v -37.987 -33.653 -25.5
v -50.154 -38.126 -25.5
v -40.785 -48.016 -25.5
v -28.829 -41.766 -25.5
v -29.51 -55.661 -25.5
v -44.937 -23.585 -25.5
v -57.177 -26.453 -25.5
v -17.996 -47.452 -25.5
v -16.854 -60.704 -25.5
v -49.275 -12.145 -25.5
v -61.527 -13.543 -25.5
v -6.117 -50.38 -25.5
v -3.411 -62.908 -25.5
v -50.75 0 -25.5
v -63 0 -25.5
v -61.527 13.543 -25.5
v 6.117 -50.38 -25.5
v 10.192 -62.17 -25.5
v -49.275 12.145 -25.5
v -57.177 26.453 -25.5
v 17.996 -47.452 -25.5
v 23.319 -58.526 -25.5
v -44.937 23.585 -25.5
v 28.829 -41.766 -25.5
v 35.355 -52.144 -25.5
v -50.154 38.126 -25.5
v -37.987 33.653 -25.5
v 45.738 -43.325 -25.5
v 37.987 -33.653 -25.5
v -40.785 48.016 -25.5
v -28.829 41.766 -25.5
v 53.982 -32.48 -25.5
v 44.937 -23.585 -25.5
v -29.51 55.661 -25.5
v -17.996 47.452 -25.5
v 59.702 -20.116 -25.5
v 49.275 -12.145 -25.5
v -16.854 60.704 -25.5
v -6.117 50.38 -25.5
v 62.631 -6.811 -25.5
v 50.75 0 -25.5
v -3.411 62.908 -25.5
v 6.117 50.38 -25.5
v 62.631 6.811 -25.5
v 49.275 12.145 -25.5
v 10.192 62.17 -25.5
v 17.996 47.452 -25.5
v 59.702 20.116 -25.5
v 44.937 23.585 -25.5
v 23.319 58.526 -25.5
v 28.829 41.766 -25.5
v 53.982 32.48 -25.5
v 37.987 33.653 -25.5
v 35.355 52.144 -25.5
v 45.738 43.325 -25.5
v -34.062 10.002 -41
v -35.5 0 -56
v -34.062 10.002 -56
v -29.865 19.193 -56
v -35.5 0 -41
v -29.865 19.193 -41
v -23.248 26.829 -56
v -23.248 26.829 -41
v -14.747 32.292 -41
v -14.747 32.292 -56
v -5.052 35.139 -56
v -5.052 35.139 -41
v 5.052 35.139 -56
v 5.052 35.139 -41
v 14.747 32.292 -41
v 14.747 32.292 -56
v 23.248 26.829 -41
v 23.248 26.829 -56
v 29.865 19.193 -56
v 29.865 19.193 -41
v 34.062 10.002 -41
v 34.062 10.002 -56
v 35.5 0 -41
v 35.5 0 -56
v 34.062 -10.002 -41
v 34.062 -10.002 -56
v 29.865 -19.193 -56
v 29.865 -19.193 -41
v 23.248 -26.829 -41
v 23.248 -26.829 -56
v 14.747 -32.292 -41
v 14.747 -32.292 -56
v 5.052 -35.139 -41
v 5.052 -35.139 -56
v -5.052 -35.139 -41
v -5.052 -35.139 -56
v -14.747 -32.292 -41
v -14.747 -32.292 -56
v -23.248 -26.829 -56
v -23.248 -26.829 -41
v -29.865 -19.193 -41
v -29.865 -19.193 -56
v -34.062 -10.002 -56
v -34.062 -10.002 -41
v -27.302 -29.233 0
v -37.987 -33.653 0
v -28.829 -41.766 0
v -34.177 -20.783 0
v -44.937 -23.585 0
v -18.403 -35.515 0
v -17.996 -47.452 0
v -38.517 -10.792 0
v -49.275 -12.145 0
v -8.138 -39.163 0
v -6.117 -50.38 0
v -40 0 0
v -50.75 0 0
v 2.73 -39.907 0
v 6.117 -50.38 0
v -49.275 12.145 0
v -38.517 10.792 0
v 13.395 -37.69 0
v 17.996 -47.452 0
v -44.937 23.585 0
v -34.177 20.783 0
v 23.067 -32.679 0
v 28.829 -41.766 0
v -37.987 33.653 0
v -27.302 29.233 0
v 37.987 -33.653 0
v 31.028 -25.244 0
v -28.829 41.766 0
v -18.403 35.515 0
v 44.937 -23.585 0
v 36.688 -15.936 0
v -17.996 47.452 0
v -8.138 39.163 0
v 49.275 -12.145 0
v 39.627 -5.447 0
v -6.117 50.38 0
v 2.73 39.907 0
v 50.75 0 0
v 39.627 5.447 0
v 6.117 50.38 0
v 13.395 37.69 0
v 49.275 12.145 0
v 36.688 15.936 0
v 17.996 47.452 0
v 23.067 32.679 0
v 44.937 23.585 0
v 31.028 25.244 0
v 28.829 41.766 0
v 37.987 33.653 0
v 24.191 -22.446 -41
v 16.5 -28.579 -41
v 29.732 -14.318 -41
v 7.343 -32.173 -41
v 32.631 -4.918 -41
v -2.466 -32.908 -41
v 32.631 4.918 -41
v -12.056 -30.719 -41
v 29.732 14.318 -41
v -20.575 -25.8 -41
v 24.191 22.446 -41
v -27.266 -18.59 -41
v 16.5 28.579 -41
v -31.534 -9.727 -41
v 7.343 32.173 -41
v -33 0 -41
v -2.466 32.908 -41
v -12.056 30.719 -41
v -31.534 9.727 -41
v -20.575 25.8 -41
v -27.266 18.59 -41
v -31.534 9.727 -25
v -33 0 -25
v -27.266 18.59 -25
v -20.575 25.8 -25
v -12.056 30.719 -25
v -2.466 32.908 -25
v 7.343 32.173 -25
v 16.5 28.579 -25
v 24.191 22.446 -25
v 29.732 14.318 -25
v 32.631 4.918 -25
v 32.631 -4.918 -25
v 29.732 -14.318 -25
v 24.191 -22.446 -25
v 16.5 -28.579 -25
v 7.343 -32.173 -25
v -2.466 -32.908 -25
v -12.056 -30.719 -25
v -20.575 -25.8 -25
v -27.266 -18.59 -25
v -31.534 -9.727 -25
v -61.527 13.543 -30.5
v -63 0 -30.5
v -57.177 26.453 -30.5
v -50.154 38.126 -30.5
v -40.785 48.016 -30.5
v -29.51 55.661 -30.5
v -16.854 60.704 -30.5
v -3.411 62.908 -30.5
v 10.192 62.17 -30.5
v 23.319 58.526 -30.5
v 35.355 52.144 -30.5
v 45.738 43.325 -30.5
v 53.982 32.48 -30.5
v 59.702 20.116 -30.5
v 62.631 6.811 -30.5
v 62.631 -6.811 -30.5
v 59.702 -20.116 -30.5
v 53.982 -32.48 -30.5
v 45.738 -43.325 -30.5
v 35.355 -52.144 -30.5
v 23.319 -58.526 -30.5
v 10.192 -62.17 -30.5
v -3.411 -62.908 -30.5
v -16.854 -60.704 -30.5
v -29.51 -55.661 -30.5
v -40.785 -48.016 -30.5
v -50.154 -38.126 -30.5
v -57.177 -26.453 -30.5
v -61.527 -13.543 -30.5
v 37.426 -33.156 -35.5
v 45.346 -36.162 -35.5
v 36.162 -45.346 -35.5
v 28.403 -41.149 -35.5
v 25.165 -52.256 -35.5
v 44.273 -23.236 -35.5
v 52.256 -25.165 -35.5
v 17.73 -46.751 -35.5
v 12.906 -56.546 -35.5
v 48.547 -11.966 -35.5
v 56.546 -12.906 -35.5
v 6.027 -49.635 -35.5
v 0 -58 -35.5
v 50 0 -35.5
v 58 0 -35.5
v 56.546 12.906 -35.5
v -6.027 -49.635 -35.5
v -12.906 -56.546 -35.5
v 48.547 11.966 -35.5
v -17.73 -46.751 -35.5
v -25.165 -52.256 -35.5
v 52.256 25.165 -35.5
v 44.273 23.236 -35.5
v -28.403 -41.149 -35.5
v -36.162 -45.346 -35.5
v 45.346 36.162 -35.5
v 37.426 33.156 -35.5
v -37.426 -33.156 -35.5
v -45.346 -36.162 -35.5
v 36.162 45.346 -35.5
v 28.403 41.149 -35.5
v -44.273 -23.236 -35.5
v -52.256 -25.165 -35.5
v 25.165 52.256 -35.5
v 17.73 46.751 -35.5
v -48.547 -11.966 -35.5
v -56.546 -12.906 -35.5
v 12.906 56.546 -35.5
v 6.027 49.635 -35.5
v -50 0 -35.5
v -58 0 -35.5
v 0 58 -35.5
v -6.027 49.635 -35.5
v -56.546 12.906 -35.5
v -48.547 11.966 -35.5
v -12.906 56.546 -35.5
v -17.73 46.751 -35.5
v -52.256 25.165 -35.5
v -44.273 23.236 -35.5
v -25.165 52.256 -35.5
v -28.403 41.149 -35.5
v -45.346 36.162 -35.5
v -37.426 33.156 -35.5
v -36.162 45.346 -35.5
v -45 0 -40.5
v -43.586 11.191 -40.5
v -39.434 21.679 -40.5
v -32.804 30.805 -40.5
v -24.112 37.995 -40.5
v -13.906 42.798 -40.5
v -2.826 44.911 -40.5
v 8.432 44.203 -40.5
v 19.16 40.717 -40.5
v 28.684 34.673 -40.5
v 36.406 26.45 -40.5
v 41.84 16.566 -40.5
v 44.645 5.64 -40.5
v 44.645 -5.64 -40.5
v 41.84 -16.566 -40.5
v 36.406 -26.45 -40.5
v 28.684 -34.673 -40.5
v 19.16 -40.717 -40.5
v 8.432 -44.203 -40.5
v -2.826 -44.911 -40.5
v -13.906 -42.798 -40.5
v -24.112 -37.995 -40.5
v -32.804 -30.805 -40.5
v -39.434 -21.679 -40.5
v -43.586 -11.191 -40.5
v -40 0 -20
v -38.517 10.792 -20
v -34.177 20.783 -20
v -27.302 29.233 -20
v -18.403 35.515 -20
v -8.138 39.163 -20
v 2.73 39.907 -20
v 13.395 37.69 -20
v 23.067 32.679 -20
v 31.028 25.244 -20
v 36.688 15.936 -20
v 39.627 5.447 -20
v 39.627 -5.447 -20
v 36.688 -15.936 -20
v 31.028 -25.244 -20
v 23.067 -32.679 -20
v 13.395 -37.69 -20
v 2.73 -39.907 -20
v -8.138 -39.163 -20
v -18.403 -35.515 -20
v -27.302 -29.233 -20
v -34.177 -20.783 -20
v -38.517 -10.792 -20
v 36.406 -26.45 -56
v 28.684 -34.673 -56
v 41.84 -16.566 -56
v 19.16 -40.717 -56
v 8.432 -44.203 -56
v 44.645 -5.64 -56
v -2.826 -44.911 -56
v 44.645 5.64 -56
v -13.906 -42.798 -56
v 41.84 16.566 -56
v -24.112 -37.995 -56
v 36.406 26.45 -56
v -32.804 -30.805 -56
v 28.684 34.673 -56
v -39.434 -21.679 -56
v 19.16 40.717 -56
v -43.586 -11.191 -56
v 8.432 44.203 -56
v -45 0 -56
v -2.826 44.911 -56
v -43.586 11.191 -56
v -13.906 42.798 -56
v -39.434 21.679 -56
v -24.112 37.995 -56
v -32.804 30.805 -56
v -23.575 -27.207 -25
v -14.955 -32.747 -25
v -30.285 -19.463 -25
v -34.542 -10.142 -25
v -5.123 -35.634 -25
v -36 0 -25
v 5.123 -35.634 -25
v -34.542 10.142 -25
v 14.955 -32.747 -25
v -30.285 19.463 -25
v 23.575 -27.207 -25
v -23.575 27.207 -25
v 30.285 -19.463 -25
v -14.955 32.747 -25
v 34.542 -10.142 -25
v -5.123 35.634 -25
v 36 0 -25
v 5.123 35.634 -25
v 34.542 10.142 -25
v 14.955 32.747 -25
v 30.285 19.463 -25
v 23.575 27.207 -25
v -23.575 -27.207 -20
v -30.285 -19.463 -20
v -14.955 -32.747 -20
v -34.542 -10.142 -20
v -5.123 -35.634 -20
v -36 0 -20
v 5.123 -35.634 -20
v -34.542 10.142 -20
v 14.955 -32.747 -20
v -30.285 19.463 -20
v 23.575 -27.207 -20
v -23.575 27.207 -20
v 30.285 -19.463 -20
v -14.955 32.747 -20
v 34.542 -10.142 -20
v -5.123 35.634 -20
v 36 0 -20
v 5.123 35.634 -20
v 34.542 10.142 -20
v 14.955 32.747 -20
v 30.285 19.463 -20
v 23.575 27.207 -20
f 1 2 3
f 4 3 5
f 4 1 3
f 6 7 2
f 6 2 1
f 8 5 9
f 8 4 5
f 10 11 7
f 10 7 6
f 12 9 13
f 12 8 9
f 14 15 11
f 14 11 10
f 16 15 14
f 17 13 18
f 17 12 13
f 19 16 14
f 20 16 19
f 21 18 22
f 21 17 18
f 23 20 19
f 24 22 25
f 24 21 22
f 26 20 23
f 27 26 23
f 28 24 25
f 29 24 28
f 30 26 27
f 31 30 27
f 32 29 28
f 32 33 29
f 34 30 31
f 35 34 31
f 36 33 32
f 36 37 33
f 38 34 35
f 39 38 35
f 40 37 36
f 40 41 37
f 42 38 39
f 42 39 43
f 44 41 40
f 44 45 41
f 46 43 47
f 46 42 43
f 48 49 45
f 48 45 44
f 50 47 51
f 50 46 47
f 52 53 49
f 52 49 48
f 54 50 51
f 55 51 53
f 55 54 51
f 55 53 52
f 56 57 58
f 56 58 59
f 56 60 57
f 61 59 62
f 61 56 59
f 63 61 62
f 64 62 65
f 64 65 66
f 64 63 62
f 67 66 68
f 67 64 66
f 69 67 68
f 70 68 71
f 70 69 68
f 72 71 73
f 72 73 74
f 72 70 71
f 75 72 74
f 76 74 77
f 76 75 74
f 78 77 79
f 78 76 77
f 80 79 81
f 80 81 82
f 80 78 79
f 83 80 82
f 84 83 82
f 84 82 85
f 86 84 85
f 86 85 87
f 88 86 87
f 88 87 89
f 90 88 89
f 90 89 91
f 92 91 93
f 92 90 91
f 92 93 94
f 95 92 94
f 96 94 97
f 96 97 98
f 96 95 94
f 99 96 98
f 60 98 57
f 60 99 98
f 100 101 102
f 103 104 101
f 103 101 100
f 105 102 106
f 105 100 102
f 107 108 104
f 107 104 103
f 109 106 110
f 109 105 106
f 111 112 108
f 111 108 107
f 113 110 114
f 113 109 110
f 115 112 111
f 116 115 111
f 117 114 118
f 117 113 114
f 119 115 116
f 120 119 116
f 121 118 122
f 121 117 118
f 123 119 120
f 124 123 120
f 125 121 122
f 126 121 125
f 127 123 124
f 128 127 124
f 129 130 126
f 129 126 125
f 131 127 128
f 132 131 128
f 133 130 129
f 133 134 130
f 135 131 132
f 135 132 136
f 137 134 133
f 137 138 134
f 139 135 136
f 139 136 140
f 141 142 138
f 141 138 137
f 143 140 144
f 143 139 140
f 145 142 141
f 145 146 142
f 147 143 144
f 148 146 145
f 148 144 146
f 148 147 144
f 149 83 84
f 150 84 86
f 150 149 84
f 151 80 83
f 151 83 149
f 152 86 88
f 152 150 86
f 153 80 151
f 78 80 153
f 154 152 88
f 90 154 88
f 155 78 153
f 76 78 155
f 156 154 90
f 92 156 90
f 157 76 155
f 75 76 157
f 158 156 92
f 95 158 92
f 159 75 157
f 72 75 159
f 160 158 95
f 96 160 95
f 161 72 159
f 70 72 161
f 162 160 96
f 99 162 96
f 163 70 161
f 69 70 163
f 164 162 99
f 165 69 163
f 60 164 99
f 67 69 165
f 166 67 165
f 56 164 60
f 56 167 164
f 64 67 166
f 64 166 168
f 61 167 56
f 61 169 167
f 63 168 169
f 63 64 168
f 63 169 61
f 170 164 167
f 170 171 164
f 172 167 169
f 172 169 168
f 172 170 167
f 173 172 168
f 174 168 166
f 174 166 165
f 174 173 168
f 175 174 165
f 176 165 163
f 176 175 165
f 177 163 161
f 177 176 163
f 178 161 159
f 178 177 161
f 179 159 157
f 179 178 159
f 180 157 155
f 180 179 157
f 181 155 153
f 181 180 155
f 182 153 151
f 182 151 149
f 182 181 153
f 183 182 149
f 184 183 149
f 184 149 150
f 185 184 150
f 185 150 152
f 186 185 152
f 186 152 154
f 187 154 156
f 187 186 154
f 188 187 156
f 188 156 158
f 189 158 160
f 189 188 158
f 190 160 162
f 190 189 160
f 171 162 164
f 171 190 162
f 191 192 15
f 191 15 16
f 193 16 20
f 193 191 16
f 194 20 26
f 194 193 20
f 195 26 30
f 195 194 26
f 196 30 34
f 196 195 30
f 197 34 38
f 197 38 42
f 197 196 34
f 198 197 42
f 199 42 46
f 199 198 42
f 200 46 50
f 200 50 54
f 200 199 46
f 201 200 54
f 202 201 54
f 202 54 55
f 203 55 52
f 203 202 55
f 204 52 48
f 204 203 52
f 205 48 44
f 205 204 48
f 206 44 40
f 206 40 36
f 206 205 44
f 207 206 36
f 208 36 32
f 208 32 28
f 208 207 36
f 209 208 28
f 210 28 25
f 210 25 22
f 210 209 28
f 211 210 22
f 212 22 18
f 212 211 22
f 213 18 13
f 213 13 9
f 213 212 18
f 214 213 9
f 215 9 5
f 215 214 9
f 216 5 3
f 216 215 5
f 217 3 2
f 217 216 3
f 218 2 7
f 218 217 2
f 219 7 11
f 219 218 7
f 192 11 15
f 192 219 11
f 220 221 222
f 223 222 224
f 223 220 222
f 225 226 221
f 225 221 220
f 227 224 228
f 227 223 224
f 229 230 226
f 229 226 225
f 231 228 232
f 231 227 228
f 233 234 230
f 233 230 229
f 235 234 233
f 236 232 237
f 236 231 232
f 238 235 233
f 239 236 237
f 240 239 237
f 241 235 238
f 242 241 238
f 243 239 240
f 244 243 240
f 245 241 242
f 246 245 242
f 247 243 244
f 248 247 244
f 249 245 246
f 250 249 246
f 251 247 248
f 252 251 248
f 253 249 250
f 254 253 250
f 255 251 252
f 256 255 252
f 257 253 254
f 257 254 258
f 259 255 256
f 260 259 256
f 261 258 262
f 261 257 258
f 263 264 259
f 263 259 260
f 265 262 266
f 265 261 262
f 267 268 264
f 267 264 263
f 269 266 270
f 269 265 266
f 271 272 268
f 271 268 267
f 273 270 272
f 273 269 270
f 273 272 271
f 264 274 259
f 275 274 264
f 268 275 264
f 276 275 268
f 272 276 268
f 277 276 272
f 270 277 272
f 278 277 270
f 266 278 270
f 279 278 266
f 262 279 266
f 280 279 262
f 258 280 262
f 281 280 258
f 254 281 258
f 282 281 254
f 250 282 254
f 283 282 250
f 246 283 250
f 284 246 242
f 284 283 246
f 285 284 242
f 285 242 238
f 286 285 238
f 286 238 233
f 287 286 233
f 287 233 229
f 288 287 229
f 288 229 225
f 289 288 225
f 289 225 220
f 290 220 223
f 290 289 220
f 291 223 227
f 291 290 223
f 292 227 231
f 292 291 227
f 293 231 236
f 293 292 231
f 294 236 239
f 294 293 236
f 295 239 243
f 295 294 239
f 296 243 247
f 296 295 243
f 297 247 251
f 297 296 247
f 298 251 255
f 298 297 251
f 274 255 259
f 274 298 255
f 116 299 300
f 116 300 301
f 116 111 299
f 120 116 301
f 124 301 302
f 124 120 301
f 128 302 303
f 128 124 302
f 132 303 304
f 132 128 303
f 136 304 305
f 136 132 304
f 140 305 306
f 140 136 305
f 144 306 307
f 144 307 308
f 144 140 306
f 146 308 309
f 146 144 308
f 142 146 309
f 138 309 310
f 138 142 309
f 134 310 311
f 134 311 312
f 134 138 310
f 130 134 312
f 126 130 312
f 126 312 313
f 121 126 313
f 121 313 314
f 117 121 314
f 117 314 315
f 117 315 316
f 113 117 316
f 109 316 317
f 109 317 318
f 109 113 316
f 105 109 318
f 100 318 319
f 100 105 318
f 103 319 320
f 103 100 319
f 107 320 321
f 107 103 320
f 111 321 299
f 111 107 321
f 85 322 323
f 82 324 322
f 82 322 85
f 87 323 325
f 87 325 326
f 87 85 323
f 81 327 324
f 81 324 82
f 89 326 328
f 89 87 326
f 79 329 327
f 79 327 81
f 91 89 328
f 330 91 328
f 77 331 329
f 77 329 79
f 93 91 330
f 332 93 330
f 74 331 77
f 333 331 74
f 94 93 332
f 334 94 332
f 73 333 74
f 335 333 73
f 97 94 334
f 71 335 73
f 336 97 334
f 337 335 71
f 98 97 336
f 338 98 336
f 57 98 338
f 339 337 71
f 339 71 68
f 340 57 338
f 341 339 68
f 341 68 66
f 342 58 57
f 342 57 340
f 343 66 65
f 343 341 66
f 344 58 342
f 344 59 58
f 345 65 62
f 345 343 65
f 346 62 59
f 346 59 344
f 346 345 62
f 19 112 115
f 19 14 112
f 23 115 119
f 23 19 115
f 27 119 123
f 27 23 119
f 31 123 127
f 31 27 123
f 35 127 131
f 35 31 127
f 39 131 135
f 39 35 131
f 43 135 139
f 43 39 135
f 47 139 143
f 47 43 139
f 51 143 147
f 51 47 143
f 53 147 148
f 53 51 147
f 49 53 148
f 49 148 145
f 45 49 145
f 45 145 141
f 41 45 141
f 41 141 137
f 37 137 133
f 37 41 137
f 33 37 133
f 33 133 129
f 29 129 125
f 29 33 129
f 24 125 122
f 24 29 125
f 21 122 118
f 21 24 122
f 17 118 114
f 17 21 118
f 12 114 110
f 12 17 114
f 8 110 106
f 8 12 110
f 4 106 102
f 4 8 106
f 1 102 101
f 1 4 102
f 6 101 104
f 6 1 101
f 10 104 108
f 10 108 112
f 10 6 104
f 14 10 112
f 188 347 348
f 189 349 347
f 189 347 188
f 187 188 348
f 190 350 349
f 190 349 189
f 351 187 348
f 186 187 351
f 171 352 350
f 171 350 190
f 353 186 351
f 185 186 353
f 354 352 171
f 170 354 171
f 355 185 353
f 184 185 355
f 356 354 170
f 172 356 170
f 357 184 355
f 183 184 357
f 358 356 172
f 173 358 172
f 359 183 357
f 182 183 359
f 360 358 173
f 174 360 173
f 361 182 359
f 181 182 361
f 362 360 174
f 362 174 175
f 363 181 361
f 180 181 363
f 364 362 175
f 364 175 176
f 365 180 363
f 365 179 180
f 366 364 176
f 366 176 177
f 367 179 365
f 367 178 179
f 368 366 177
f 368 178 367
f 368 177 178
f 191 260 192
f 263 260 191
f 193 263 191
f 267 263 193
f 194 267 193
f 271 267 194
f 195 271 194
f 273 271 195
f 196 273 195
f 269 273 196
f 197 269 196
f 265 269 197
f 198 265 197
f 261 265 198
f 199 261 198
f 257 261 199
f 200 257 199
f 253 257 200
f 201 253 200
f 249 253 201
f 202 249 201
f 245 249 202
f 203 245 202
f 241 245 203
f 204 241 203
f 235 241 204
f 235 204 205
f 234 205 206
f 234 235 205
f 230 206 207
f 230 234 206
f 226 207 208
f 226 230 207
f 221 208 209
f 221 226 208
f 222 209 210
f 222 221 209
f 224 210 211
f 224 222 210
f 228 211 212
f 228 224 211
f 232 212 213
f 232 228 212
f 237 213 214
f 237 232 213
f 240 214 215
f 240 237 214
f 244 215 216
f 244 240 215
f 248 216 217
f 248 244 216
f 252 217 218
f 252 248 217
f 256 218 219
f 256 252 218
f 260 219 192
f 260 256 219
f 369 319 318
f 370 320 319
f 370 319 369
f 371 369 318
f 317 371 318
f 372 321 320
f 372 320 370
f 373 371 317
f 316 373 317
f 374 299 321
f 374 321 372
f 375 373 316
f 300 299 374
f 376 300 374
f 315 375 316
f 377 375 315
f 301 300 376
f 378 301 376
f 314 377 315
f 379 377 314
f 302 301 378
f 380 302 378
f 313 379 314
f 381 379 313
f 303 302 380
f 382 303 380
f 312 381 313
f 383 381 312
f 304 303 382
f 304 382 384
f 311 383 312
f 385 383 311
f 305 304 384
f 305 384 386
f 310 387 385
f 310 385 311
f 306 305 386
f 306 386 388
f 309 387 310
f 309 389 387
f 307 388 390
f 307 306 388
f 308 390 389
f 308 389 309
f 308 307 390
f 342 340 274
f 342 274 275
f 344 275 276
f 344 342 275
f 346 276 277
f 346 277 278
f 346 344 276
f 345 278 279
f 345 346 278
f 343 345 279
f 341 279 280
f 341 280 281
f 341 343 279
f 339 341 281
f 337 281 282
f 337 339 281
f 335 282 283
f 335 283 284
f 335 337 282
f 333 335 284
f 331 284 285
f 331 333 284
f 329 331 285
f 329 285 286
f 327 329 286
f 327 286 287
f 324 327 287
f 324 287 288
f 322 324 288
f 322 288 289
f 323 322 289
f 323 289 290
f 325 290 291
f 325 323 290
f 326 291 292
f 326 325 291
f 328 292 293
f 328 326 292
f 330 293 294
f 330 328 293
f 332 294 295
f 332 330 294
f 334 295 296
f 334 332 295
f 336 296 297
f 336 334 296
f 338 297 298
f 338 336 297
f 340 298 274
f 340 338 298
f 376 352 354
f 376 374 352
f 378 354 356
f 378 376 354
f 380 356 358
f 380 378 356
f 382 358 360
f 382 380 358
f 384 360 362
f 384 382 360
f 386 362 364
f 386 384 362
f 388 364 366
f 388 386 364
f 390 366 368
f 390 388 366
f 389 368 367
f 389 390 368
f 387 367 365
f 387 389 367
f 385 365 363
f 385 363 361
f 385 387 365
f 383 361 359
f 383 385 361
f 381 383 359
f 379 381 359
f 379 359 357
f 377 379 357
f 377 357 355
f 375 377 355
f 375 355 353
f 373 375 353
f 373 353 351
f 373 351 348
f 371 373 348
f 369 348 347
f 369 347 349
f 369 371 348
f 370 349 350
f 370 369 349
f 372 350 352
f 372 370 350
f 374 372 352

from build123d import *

# Parameters (mm, degrees)
F2_SIZE = 5


with BuildPart() as f1:
    # F0 (on Front) → F1 (revolve)
    with BuildSketch(Plane.XZ):
        Polygon((-40, -20), (-40, 0), (-50.75, 0), (-50.75, -25.5), (-63, -25.5), (-63, -35.5), (-45, -35.5), (-45, -56), (-35.5, -56), (-35.5, -41), (-33, -41), (-33, -25), (-36, -25), (-36, -20), align=None)
    revolve(axis=Axis((0, 0, -28), (0, 0, -1)))

    # F2
    f2_edges = [f1.edges().sort_by_distance(p)[0] for p in [
        (63, 0, -35.5),
        (45, 0, -35.5),
    ]]
    chamfer(f2_edges, length=F2_SIZE)


solid = f1.part
